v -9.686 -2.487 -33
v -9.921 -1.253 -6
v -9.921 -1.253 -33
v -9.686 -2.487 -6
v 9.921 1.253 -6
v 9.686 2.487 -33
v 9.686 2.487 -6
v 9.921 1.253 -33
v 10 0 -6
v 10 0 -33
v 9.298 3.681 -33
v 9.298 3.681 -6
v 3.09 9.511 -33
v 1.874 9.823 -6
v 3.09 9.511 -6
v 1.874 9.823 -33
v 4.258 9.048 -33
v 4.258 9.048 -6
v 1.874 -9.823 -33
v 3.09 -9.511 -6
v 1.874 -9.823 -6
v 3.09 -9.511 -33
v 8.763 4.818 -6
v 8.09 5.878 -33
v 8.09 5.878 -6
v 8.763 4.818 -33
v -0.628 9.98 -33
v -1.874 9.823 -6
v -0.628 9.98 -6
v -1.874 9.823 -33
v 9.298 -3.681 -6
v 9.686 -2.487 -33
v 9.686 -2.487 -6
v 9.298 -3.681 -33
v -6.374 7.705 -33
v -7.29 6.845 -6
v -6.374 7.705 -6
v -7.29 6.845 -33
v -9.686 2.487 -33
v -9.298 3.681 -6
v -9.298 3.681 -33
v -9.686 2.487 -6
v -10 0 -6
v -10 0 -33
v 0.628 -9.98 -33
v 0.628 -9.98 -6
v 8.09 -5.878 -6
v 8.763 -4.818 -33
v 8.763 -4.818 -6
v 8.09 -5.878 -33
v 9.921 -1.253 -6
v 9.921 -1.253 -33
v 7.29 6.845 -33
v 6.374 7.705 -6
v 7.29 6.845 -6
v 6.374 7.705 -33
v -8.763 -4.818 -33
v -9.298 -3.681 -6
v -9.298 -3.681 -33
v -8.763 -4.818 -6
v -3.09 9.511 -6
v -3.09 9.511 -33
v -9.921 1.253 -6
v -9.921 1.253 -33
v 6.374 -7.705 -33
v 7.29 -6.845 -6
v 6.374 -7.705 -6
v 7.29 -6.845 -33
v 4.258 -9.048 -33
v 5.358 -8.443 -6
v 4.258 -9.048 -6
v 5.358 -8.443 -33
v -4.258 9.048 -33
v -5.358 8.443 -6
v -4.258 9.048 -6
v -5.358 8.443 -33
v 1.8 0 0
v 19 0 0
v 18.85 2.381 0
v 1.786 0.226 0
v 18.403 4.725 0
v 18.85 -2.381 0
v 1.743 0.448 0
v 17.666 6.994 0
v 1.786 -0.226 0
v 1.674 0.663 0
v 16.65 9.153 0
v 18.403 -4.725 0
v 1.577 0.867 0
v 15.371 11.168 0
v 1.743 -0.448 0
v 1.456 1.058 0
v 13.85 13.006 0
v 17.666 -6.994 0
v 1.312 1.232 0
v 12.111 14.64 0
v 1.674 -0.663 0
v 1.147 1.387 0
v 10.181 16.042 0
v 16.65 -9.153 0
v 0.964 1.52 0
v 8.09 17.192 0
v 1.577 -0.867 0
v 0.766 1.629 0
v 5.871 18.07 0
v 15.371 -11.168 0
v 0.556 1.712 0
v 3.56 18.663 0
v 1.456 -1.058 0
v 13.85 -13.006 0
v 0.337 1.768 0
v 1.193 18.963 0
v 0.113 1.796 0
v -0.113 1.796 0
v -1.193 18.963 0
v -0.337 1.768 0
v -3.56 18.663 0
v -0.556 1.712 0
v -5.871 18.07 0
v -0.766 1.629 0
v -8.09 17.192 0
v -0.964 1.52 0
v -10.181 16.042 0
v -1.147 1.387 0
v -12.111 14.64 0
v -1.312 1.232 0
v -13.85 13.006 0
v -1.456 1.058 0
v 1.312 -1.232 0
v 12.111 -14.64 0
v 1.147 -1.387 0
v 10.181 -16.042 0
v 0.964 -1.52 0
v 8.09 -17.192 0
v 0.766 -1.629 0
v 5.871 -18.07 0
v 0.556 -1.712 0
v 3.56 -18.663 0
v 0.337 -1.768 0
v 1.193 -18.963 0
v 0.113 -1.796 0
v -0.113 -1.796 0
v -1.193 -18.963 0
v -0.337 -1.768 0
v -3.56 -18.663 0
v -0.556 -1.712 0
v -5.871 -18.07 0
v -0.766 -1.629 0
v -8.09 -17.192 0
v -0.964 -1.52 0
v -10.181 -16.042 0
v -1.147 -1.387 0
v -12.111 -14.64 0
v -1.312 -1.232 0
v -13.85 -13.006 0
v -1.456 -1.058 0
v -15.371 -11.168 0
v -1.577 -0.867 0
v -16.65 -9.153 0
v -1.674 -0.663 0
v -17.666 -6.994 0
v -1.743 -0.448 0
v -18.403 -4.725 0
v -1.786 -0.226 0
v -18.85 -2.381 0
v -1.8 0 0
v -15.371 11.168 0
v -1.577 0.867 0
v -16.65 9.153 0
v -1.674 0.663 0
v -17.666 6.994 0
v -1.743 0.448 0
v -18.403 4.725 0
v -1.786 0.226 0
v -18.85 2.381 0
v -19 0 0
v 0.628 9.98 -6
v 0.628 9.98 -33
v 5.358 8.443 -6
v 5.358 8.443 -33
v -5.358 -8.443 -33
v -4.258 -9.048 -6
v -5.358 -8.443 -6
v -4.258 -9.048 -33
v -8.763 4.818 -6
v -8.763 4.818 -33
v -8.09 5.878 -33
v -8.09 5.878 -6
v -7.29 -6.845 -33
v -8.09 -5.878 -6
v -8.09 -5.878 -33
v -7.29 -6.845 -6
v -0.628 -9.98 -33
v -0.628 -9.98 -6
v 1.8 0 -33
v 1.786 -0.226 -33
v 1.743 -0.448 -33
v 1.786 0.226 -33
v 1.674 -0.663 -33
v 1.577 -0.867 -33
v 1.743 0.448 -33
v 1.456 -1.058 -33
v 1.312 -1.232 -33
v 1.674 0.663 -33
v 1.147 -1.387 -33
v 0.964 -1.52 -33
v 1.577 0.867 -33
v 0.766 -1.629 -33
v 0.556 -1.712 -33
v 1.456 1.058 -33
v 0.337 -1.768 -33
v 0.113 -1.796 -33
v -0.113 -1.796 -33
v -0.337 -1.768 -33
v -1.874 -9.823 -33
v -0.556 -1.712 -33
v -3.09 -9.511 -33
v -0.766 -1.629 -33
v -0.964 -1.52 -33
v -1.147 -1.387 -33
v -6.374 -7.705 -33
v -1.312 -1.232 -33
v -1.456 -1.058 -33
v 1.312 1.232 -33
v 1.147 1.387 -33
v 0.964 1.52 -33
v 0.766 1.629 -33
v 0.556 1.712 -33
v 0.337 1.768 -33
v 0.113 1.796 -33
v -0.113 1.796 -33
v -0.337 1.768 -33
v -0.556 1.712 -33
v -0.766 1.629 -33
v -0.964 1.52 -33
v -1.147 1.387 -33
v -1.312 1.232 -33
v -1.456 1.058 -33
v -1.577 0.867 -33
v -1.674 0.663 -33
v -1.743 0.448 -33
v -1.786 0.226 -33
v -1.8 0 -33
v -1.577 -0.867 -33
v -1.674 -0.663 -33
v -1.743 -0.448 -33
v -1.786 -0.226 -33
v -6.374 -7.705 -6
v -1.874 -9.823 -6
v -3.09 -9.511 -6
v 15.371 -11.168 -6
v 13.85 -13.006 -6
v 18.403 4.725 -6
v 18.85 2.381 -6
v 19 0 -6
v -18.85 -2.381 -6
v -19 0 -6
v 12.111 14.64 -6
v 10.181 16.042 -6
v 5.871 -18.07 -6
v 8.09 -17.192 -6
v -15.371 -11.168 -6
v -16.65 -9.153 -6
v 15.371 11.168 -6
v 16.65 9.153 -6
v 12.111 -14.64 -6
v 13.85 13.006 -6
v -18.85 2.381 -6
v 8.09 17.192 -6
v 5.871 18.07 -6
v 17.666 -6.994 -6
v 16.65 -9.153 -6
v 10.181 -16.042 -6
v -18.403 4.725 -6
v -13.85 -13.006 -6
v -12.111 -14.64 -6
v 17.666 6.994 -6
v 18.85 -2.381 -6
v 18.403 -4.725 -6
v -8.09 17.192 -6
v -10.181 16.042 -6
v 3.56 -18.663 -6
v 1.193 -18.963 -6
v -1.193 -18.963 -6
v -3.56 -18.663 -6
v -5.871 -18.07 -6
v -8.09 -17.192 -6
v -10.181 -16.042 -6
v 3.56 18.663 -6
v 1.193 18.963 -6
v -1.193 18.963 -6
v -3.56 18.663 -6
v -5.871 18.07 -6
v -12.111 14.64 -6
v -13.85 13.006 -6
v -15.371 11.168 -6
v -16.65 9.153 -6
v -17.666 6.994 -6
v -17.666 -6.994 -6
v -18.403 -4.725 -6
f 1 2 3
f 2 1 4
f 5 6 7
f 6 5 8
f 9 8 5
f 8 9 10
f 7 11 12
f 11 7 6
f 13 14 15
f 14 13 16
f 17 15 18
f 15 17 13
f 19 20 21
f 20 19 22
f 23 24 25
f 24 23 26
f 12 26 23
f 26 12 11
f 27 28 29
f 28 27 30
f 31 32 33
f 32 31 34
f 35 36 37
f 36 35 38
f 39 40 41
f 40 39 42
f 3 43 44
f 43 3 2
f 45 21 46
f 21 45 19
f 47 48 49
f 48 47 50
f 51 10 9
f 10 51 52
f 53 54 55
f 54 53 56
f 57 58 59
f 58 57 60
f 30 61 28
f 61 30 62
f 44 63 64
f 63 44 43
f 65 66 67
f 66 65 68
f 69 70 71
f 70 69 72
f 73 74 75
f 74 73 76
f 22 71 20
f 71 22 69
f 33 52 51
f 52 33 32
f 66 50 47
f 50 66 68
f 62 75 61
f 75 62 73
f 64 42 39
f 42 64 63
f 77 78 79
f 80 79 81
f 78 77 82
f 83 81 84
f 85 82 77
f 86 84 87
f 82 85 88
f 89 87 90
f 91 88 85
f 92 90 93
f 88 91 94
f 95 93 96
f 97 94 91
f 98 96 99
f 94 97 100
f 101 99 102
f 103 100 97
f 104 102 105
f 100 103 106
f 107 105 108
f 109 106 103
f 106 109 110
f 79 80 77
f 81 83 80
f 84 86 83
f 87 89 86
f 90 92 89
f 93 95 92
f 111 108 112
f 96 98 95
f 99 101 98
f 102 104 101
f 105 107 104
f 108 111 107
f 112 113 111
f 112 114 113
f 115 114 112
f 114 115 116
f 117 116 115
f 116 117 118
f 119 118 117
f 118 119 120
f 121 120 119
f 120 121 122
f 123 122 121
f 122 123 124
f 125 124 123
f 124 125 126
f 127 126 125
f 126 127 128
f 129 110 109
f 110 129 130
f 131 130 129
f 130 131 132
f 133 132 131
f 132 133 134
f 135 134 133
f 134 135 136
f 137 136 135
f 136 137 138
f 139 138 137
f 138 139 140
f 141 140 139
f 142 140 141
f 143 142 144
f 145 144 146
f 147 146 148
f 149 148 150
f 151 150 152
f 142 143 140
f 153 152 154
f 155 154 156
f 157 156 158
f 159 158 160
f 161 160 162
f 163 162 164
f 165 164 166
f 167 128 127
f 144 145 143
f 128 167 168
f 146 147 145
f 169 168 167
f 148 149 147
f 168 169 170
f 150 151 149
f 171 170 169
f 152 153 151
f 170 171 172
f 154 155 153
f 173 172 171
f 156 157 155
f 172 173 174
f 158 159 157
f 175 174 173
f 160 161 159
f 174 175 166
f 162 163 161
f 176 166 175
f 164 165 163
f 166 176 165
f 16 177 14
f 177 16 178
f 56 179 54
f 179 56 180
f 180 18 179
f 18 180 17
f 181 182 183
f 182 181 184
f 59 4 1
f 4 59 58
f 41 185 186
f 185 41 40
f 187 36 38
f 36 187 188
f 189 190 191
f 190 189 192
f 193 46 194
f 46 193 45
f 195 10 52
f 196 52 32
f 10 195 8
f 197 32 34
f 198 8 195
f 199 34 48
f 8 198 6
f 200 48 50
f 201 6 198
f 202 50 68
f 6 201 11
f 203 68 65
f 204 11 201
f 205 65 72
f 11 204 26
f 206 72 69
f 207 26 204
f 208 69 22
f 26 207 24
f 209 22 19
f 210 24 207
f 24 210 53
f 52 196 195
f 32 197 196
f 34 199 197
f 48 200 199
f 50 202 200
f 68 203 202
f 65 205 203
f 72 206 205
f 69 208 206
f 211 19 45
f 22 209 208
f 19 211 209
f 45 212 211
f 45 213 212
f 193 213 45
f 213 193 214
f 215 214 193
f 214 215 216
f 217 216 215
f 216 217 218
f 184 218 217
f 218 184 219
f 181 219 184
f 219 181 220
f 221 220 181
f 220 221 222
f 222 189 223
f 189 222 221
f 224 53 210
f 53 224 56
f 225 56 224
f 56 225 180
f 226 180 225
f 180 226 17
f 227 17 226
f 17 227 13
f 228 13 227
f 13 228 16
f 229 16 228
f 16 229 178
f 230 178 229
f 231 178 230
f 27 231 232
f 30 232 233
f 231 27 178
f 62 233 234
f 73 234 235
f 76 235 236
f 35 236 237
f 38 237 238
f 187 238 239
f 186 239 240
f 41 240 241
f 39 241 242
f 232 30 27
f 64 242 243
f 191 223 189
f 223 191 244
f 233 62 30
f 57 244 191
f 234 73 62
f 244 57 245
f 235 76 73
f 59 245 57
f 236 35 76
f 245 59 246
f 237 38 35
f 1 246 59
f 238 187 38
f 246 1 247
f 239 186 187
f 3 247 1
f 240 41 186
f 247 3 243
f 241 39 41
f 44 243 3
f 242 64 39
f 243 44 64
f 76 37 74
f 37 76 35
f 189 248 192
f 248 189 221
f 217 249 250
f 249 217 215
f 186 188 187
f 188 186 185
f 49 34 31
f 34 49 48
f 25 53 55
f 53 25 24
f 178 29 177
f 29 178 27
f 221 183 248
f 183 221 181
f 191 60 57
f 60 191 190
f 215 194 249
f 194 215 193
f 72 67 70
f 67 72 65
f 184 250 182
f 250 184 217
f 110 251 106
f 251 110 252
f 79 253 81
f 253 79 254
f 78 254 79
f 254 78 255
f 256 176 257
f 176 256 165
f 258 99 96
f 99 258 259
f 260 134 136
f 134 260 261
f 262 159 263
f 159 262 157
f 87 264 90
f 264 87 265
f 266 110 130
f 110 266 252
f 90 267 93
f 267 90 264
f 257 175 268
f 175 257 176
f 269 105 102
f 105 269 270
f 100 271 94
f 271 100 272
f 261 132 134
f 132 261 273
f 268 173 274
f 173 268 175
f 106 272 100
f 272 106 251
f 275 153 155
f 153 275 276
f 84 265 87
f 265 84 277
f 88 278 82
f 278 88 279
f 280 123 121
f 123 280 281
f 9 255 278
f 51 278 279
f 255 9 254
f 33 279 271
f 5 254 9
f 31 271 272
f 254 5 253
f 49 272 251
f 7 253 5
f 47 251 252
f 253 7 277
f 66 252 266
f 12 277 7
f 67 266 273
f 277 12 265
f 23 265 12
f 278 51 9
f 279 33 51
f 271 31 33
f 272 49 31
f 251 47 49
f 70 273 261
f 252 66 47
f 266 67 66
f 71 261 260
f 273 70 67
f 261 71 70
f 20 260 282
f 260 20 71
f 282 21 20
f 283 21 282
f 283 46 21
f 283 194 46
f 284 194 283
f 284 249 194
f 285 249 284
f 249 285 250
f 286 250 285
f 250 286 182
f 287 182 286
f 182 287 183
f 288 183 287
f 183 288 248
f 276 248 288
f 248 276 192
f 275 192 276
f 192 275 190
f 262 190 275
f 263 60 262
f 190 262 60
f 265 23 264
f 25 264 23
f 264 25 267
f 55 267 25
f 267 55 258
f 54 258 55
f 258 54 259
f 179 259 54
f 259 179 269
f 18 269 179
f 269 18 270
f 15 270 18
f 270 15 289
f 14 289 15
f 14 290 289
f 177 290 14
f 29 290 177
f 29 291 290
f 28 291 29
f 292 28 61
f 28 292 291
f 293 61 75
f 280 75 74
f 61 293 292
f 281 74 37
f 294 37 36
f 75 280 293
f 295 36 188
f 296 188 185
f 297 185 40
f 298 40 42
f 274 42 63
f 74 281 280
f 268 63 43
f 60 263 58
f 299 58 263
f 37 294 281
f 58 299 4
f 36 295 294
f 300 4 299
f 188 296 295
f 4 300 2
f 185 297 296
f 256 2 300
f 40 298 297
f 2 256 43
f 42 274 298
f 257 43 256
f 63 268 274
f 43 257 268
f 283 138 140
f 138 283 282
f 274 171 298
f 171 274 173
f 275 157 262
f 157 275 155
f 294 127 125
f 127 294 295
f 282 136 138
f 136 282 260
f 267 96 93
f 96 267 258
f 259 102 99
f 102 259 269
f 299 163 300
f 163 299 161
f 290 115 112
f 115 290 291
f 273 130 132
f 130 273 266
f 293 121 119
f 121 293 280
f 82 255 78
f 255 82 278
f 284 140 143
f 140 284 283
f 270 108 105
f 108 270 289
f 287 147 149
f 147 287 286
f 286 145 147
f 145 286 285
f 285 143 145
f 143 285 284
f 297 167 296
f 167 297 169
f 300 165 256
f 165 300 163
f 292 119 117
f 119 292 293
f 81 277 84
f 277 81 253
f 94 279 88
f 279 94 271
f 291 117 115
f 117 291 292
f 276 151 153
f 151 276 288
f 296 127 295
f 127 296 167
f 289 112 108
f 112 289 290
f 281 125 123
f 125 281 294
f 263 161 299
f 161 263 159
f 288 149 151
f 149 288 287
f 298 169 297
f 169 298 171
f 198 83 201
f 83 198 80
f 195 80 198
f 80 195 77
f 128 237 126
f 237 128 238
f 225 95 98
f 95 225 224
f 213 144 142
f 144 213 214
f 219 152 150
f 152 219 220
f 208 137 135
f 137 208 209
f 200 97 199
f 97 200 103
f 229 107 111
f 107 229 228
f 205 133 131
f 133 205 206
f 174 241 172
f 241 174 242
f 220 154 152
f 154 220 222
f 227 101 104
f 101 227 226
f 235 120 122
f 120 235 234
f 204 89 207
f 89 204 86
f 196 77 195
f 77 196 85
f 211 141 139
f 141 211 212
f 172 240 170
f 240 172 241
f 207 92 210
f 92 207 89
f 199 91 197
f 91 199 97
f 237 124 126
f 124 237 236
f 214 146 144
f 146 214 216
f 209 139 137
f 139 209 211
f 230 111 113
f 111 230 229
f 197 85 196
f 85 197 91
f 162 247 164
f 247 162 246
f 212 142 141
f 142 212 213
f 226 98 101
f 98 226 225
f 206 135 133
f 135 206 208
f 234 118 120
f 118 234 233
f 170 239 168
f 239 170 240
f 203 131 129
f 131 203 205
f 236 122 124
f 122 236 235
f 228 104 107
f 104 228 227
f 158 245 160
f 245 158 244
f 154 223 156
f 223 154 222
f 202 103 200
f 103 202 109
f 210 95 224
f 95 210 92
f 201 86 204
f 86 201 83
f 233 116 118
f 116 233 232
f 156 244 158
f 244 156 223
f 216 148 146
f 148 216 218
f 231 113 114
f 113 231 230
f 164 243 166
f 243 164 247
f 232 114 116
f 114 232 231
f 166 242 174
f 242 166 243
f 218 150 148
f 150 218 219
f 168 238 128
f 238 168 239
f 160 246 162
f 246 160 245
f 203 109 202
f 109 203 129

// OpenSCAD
$fn = 50;


difference() {
	union() {
		translate(v = [0, 0, -33.0000000000]) {
			cylinder(h = 33, r = 10.0000000000);
		}
		translate(v = [0, 0, -6.0000000000]) {
			cylinder(h = 6, r = 19.0000000000);
		}
	}
	union() {
		#translate(v = [0, 0, -33]) {
			cylinder(h = 33, r = 1.8000000000);
		}
	}
}
